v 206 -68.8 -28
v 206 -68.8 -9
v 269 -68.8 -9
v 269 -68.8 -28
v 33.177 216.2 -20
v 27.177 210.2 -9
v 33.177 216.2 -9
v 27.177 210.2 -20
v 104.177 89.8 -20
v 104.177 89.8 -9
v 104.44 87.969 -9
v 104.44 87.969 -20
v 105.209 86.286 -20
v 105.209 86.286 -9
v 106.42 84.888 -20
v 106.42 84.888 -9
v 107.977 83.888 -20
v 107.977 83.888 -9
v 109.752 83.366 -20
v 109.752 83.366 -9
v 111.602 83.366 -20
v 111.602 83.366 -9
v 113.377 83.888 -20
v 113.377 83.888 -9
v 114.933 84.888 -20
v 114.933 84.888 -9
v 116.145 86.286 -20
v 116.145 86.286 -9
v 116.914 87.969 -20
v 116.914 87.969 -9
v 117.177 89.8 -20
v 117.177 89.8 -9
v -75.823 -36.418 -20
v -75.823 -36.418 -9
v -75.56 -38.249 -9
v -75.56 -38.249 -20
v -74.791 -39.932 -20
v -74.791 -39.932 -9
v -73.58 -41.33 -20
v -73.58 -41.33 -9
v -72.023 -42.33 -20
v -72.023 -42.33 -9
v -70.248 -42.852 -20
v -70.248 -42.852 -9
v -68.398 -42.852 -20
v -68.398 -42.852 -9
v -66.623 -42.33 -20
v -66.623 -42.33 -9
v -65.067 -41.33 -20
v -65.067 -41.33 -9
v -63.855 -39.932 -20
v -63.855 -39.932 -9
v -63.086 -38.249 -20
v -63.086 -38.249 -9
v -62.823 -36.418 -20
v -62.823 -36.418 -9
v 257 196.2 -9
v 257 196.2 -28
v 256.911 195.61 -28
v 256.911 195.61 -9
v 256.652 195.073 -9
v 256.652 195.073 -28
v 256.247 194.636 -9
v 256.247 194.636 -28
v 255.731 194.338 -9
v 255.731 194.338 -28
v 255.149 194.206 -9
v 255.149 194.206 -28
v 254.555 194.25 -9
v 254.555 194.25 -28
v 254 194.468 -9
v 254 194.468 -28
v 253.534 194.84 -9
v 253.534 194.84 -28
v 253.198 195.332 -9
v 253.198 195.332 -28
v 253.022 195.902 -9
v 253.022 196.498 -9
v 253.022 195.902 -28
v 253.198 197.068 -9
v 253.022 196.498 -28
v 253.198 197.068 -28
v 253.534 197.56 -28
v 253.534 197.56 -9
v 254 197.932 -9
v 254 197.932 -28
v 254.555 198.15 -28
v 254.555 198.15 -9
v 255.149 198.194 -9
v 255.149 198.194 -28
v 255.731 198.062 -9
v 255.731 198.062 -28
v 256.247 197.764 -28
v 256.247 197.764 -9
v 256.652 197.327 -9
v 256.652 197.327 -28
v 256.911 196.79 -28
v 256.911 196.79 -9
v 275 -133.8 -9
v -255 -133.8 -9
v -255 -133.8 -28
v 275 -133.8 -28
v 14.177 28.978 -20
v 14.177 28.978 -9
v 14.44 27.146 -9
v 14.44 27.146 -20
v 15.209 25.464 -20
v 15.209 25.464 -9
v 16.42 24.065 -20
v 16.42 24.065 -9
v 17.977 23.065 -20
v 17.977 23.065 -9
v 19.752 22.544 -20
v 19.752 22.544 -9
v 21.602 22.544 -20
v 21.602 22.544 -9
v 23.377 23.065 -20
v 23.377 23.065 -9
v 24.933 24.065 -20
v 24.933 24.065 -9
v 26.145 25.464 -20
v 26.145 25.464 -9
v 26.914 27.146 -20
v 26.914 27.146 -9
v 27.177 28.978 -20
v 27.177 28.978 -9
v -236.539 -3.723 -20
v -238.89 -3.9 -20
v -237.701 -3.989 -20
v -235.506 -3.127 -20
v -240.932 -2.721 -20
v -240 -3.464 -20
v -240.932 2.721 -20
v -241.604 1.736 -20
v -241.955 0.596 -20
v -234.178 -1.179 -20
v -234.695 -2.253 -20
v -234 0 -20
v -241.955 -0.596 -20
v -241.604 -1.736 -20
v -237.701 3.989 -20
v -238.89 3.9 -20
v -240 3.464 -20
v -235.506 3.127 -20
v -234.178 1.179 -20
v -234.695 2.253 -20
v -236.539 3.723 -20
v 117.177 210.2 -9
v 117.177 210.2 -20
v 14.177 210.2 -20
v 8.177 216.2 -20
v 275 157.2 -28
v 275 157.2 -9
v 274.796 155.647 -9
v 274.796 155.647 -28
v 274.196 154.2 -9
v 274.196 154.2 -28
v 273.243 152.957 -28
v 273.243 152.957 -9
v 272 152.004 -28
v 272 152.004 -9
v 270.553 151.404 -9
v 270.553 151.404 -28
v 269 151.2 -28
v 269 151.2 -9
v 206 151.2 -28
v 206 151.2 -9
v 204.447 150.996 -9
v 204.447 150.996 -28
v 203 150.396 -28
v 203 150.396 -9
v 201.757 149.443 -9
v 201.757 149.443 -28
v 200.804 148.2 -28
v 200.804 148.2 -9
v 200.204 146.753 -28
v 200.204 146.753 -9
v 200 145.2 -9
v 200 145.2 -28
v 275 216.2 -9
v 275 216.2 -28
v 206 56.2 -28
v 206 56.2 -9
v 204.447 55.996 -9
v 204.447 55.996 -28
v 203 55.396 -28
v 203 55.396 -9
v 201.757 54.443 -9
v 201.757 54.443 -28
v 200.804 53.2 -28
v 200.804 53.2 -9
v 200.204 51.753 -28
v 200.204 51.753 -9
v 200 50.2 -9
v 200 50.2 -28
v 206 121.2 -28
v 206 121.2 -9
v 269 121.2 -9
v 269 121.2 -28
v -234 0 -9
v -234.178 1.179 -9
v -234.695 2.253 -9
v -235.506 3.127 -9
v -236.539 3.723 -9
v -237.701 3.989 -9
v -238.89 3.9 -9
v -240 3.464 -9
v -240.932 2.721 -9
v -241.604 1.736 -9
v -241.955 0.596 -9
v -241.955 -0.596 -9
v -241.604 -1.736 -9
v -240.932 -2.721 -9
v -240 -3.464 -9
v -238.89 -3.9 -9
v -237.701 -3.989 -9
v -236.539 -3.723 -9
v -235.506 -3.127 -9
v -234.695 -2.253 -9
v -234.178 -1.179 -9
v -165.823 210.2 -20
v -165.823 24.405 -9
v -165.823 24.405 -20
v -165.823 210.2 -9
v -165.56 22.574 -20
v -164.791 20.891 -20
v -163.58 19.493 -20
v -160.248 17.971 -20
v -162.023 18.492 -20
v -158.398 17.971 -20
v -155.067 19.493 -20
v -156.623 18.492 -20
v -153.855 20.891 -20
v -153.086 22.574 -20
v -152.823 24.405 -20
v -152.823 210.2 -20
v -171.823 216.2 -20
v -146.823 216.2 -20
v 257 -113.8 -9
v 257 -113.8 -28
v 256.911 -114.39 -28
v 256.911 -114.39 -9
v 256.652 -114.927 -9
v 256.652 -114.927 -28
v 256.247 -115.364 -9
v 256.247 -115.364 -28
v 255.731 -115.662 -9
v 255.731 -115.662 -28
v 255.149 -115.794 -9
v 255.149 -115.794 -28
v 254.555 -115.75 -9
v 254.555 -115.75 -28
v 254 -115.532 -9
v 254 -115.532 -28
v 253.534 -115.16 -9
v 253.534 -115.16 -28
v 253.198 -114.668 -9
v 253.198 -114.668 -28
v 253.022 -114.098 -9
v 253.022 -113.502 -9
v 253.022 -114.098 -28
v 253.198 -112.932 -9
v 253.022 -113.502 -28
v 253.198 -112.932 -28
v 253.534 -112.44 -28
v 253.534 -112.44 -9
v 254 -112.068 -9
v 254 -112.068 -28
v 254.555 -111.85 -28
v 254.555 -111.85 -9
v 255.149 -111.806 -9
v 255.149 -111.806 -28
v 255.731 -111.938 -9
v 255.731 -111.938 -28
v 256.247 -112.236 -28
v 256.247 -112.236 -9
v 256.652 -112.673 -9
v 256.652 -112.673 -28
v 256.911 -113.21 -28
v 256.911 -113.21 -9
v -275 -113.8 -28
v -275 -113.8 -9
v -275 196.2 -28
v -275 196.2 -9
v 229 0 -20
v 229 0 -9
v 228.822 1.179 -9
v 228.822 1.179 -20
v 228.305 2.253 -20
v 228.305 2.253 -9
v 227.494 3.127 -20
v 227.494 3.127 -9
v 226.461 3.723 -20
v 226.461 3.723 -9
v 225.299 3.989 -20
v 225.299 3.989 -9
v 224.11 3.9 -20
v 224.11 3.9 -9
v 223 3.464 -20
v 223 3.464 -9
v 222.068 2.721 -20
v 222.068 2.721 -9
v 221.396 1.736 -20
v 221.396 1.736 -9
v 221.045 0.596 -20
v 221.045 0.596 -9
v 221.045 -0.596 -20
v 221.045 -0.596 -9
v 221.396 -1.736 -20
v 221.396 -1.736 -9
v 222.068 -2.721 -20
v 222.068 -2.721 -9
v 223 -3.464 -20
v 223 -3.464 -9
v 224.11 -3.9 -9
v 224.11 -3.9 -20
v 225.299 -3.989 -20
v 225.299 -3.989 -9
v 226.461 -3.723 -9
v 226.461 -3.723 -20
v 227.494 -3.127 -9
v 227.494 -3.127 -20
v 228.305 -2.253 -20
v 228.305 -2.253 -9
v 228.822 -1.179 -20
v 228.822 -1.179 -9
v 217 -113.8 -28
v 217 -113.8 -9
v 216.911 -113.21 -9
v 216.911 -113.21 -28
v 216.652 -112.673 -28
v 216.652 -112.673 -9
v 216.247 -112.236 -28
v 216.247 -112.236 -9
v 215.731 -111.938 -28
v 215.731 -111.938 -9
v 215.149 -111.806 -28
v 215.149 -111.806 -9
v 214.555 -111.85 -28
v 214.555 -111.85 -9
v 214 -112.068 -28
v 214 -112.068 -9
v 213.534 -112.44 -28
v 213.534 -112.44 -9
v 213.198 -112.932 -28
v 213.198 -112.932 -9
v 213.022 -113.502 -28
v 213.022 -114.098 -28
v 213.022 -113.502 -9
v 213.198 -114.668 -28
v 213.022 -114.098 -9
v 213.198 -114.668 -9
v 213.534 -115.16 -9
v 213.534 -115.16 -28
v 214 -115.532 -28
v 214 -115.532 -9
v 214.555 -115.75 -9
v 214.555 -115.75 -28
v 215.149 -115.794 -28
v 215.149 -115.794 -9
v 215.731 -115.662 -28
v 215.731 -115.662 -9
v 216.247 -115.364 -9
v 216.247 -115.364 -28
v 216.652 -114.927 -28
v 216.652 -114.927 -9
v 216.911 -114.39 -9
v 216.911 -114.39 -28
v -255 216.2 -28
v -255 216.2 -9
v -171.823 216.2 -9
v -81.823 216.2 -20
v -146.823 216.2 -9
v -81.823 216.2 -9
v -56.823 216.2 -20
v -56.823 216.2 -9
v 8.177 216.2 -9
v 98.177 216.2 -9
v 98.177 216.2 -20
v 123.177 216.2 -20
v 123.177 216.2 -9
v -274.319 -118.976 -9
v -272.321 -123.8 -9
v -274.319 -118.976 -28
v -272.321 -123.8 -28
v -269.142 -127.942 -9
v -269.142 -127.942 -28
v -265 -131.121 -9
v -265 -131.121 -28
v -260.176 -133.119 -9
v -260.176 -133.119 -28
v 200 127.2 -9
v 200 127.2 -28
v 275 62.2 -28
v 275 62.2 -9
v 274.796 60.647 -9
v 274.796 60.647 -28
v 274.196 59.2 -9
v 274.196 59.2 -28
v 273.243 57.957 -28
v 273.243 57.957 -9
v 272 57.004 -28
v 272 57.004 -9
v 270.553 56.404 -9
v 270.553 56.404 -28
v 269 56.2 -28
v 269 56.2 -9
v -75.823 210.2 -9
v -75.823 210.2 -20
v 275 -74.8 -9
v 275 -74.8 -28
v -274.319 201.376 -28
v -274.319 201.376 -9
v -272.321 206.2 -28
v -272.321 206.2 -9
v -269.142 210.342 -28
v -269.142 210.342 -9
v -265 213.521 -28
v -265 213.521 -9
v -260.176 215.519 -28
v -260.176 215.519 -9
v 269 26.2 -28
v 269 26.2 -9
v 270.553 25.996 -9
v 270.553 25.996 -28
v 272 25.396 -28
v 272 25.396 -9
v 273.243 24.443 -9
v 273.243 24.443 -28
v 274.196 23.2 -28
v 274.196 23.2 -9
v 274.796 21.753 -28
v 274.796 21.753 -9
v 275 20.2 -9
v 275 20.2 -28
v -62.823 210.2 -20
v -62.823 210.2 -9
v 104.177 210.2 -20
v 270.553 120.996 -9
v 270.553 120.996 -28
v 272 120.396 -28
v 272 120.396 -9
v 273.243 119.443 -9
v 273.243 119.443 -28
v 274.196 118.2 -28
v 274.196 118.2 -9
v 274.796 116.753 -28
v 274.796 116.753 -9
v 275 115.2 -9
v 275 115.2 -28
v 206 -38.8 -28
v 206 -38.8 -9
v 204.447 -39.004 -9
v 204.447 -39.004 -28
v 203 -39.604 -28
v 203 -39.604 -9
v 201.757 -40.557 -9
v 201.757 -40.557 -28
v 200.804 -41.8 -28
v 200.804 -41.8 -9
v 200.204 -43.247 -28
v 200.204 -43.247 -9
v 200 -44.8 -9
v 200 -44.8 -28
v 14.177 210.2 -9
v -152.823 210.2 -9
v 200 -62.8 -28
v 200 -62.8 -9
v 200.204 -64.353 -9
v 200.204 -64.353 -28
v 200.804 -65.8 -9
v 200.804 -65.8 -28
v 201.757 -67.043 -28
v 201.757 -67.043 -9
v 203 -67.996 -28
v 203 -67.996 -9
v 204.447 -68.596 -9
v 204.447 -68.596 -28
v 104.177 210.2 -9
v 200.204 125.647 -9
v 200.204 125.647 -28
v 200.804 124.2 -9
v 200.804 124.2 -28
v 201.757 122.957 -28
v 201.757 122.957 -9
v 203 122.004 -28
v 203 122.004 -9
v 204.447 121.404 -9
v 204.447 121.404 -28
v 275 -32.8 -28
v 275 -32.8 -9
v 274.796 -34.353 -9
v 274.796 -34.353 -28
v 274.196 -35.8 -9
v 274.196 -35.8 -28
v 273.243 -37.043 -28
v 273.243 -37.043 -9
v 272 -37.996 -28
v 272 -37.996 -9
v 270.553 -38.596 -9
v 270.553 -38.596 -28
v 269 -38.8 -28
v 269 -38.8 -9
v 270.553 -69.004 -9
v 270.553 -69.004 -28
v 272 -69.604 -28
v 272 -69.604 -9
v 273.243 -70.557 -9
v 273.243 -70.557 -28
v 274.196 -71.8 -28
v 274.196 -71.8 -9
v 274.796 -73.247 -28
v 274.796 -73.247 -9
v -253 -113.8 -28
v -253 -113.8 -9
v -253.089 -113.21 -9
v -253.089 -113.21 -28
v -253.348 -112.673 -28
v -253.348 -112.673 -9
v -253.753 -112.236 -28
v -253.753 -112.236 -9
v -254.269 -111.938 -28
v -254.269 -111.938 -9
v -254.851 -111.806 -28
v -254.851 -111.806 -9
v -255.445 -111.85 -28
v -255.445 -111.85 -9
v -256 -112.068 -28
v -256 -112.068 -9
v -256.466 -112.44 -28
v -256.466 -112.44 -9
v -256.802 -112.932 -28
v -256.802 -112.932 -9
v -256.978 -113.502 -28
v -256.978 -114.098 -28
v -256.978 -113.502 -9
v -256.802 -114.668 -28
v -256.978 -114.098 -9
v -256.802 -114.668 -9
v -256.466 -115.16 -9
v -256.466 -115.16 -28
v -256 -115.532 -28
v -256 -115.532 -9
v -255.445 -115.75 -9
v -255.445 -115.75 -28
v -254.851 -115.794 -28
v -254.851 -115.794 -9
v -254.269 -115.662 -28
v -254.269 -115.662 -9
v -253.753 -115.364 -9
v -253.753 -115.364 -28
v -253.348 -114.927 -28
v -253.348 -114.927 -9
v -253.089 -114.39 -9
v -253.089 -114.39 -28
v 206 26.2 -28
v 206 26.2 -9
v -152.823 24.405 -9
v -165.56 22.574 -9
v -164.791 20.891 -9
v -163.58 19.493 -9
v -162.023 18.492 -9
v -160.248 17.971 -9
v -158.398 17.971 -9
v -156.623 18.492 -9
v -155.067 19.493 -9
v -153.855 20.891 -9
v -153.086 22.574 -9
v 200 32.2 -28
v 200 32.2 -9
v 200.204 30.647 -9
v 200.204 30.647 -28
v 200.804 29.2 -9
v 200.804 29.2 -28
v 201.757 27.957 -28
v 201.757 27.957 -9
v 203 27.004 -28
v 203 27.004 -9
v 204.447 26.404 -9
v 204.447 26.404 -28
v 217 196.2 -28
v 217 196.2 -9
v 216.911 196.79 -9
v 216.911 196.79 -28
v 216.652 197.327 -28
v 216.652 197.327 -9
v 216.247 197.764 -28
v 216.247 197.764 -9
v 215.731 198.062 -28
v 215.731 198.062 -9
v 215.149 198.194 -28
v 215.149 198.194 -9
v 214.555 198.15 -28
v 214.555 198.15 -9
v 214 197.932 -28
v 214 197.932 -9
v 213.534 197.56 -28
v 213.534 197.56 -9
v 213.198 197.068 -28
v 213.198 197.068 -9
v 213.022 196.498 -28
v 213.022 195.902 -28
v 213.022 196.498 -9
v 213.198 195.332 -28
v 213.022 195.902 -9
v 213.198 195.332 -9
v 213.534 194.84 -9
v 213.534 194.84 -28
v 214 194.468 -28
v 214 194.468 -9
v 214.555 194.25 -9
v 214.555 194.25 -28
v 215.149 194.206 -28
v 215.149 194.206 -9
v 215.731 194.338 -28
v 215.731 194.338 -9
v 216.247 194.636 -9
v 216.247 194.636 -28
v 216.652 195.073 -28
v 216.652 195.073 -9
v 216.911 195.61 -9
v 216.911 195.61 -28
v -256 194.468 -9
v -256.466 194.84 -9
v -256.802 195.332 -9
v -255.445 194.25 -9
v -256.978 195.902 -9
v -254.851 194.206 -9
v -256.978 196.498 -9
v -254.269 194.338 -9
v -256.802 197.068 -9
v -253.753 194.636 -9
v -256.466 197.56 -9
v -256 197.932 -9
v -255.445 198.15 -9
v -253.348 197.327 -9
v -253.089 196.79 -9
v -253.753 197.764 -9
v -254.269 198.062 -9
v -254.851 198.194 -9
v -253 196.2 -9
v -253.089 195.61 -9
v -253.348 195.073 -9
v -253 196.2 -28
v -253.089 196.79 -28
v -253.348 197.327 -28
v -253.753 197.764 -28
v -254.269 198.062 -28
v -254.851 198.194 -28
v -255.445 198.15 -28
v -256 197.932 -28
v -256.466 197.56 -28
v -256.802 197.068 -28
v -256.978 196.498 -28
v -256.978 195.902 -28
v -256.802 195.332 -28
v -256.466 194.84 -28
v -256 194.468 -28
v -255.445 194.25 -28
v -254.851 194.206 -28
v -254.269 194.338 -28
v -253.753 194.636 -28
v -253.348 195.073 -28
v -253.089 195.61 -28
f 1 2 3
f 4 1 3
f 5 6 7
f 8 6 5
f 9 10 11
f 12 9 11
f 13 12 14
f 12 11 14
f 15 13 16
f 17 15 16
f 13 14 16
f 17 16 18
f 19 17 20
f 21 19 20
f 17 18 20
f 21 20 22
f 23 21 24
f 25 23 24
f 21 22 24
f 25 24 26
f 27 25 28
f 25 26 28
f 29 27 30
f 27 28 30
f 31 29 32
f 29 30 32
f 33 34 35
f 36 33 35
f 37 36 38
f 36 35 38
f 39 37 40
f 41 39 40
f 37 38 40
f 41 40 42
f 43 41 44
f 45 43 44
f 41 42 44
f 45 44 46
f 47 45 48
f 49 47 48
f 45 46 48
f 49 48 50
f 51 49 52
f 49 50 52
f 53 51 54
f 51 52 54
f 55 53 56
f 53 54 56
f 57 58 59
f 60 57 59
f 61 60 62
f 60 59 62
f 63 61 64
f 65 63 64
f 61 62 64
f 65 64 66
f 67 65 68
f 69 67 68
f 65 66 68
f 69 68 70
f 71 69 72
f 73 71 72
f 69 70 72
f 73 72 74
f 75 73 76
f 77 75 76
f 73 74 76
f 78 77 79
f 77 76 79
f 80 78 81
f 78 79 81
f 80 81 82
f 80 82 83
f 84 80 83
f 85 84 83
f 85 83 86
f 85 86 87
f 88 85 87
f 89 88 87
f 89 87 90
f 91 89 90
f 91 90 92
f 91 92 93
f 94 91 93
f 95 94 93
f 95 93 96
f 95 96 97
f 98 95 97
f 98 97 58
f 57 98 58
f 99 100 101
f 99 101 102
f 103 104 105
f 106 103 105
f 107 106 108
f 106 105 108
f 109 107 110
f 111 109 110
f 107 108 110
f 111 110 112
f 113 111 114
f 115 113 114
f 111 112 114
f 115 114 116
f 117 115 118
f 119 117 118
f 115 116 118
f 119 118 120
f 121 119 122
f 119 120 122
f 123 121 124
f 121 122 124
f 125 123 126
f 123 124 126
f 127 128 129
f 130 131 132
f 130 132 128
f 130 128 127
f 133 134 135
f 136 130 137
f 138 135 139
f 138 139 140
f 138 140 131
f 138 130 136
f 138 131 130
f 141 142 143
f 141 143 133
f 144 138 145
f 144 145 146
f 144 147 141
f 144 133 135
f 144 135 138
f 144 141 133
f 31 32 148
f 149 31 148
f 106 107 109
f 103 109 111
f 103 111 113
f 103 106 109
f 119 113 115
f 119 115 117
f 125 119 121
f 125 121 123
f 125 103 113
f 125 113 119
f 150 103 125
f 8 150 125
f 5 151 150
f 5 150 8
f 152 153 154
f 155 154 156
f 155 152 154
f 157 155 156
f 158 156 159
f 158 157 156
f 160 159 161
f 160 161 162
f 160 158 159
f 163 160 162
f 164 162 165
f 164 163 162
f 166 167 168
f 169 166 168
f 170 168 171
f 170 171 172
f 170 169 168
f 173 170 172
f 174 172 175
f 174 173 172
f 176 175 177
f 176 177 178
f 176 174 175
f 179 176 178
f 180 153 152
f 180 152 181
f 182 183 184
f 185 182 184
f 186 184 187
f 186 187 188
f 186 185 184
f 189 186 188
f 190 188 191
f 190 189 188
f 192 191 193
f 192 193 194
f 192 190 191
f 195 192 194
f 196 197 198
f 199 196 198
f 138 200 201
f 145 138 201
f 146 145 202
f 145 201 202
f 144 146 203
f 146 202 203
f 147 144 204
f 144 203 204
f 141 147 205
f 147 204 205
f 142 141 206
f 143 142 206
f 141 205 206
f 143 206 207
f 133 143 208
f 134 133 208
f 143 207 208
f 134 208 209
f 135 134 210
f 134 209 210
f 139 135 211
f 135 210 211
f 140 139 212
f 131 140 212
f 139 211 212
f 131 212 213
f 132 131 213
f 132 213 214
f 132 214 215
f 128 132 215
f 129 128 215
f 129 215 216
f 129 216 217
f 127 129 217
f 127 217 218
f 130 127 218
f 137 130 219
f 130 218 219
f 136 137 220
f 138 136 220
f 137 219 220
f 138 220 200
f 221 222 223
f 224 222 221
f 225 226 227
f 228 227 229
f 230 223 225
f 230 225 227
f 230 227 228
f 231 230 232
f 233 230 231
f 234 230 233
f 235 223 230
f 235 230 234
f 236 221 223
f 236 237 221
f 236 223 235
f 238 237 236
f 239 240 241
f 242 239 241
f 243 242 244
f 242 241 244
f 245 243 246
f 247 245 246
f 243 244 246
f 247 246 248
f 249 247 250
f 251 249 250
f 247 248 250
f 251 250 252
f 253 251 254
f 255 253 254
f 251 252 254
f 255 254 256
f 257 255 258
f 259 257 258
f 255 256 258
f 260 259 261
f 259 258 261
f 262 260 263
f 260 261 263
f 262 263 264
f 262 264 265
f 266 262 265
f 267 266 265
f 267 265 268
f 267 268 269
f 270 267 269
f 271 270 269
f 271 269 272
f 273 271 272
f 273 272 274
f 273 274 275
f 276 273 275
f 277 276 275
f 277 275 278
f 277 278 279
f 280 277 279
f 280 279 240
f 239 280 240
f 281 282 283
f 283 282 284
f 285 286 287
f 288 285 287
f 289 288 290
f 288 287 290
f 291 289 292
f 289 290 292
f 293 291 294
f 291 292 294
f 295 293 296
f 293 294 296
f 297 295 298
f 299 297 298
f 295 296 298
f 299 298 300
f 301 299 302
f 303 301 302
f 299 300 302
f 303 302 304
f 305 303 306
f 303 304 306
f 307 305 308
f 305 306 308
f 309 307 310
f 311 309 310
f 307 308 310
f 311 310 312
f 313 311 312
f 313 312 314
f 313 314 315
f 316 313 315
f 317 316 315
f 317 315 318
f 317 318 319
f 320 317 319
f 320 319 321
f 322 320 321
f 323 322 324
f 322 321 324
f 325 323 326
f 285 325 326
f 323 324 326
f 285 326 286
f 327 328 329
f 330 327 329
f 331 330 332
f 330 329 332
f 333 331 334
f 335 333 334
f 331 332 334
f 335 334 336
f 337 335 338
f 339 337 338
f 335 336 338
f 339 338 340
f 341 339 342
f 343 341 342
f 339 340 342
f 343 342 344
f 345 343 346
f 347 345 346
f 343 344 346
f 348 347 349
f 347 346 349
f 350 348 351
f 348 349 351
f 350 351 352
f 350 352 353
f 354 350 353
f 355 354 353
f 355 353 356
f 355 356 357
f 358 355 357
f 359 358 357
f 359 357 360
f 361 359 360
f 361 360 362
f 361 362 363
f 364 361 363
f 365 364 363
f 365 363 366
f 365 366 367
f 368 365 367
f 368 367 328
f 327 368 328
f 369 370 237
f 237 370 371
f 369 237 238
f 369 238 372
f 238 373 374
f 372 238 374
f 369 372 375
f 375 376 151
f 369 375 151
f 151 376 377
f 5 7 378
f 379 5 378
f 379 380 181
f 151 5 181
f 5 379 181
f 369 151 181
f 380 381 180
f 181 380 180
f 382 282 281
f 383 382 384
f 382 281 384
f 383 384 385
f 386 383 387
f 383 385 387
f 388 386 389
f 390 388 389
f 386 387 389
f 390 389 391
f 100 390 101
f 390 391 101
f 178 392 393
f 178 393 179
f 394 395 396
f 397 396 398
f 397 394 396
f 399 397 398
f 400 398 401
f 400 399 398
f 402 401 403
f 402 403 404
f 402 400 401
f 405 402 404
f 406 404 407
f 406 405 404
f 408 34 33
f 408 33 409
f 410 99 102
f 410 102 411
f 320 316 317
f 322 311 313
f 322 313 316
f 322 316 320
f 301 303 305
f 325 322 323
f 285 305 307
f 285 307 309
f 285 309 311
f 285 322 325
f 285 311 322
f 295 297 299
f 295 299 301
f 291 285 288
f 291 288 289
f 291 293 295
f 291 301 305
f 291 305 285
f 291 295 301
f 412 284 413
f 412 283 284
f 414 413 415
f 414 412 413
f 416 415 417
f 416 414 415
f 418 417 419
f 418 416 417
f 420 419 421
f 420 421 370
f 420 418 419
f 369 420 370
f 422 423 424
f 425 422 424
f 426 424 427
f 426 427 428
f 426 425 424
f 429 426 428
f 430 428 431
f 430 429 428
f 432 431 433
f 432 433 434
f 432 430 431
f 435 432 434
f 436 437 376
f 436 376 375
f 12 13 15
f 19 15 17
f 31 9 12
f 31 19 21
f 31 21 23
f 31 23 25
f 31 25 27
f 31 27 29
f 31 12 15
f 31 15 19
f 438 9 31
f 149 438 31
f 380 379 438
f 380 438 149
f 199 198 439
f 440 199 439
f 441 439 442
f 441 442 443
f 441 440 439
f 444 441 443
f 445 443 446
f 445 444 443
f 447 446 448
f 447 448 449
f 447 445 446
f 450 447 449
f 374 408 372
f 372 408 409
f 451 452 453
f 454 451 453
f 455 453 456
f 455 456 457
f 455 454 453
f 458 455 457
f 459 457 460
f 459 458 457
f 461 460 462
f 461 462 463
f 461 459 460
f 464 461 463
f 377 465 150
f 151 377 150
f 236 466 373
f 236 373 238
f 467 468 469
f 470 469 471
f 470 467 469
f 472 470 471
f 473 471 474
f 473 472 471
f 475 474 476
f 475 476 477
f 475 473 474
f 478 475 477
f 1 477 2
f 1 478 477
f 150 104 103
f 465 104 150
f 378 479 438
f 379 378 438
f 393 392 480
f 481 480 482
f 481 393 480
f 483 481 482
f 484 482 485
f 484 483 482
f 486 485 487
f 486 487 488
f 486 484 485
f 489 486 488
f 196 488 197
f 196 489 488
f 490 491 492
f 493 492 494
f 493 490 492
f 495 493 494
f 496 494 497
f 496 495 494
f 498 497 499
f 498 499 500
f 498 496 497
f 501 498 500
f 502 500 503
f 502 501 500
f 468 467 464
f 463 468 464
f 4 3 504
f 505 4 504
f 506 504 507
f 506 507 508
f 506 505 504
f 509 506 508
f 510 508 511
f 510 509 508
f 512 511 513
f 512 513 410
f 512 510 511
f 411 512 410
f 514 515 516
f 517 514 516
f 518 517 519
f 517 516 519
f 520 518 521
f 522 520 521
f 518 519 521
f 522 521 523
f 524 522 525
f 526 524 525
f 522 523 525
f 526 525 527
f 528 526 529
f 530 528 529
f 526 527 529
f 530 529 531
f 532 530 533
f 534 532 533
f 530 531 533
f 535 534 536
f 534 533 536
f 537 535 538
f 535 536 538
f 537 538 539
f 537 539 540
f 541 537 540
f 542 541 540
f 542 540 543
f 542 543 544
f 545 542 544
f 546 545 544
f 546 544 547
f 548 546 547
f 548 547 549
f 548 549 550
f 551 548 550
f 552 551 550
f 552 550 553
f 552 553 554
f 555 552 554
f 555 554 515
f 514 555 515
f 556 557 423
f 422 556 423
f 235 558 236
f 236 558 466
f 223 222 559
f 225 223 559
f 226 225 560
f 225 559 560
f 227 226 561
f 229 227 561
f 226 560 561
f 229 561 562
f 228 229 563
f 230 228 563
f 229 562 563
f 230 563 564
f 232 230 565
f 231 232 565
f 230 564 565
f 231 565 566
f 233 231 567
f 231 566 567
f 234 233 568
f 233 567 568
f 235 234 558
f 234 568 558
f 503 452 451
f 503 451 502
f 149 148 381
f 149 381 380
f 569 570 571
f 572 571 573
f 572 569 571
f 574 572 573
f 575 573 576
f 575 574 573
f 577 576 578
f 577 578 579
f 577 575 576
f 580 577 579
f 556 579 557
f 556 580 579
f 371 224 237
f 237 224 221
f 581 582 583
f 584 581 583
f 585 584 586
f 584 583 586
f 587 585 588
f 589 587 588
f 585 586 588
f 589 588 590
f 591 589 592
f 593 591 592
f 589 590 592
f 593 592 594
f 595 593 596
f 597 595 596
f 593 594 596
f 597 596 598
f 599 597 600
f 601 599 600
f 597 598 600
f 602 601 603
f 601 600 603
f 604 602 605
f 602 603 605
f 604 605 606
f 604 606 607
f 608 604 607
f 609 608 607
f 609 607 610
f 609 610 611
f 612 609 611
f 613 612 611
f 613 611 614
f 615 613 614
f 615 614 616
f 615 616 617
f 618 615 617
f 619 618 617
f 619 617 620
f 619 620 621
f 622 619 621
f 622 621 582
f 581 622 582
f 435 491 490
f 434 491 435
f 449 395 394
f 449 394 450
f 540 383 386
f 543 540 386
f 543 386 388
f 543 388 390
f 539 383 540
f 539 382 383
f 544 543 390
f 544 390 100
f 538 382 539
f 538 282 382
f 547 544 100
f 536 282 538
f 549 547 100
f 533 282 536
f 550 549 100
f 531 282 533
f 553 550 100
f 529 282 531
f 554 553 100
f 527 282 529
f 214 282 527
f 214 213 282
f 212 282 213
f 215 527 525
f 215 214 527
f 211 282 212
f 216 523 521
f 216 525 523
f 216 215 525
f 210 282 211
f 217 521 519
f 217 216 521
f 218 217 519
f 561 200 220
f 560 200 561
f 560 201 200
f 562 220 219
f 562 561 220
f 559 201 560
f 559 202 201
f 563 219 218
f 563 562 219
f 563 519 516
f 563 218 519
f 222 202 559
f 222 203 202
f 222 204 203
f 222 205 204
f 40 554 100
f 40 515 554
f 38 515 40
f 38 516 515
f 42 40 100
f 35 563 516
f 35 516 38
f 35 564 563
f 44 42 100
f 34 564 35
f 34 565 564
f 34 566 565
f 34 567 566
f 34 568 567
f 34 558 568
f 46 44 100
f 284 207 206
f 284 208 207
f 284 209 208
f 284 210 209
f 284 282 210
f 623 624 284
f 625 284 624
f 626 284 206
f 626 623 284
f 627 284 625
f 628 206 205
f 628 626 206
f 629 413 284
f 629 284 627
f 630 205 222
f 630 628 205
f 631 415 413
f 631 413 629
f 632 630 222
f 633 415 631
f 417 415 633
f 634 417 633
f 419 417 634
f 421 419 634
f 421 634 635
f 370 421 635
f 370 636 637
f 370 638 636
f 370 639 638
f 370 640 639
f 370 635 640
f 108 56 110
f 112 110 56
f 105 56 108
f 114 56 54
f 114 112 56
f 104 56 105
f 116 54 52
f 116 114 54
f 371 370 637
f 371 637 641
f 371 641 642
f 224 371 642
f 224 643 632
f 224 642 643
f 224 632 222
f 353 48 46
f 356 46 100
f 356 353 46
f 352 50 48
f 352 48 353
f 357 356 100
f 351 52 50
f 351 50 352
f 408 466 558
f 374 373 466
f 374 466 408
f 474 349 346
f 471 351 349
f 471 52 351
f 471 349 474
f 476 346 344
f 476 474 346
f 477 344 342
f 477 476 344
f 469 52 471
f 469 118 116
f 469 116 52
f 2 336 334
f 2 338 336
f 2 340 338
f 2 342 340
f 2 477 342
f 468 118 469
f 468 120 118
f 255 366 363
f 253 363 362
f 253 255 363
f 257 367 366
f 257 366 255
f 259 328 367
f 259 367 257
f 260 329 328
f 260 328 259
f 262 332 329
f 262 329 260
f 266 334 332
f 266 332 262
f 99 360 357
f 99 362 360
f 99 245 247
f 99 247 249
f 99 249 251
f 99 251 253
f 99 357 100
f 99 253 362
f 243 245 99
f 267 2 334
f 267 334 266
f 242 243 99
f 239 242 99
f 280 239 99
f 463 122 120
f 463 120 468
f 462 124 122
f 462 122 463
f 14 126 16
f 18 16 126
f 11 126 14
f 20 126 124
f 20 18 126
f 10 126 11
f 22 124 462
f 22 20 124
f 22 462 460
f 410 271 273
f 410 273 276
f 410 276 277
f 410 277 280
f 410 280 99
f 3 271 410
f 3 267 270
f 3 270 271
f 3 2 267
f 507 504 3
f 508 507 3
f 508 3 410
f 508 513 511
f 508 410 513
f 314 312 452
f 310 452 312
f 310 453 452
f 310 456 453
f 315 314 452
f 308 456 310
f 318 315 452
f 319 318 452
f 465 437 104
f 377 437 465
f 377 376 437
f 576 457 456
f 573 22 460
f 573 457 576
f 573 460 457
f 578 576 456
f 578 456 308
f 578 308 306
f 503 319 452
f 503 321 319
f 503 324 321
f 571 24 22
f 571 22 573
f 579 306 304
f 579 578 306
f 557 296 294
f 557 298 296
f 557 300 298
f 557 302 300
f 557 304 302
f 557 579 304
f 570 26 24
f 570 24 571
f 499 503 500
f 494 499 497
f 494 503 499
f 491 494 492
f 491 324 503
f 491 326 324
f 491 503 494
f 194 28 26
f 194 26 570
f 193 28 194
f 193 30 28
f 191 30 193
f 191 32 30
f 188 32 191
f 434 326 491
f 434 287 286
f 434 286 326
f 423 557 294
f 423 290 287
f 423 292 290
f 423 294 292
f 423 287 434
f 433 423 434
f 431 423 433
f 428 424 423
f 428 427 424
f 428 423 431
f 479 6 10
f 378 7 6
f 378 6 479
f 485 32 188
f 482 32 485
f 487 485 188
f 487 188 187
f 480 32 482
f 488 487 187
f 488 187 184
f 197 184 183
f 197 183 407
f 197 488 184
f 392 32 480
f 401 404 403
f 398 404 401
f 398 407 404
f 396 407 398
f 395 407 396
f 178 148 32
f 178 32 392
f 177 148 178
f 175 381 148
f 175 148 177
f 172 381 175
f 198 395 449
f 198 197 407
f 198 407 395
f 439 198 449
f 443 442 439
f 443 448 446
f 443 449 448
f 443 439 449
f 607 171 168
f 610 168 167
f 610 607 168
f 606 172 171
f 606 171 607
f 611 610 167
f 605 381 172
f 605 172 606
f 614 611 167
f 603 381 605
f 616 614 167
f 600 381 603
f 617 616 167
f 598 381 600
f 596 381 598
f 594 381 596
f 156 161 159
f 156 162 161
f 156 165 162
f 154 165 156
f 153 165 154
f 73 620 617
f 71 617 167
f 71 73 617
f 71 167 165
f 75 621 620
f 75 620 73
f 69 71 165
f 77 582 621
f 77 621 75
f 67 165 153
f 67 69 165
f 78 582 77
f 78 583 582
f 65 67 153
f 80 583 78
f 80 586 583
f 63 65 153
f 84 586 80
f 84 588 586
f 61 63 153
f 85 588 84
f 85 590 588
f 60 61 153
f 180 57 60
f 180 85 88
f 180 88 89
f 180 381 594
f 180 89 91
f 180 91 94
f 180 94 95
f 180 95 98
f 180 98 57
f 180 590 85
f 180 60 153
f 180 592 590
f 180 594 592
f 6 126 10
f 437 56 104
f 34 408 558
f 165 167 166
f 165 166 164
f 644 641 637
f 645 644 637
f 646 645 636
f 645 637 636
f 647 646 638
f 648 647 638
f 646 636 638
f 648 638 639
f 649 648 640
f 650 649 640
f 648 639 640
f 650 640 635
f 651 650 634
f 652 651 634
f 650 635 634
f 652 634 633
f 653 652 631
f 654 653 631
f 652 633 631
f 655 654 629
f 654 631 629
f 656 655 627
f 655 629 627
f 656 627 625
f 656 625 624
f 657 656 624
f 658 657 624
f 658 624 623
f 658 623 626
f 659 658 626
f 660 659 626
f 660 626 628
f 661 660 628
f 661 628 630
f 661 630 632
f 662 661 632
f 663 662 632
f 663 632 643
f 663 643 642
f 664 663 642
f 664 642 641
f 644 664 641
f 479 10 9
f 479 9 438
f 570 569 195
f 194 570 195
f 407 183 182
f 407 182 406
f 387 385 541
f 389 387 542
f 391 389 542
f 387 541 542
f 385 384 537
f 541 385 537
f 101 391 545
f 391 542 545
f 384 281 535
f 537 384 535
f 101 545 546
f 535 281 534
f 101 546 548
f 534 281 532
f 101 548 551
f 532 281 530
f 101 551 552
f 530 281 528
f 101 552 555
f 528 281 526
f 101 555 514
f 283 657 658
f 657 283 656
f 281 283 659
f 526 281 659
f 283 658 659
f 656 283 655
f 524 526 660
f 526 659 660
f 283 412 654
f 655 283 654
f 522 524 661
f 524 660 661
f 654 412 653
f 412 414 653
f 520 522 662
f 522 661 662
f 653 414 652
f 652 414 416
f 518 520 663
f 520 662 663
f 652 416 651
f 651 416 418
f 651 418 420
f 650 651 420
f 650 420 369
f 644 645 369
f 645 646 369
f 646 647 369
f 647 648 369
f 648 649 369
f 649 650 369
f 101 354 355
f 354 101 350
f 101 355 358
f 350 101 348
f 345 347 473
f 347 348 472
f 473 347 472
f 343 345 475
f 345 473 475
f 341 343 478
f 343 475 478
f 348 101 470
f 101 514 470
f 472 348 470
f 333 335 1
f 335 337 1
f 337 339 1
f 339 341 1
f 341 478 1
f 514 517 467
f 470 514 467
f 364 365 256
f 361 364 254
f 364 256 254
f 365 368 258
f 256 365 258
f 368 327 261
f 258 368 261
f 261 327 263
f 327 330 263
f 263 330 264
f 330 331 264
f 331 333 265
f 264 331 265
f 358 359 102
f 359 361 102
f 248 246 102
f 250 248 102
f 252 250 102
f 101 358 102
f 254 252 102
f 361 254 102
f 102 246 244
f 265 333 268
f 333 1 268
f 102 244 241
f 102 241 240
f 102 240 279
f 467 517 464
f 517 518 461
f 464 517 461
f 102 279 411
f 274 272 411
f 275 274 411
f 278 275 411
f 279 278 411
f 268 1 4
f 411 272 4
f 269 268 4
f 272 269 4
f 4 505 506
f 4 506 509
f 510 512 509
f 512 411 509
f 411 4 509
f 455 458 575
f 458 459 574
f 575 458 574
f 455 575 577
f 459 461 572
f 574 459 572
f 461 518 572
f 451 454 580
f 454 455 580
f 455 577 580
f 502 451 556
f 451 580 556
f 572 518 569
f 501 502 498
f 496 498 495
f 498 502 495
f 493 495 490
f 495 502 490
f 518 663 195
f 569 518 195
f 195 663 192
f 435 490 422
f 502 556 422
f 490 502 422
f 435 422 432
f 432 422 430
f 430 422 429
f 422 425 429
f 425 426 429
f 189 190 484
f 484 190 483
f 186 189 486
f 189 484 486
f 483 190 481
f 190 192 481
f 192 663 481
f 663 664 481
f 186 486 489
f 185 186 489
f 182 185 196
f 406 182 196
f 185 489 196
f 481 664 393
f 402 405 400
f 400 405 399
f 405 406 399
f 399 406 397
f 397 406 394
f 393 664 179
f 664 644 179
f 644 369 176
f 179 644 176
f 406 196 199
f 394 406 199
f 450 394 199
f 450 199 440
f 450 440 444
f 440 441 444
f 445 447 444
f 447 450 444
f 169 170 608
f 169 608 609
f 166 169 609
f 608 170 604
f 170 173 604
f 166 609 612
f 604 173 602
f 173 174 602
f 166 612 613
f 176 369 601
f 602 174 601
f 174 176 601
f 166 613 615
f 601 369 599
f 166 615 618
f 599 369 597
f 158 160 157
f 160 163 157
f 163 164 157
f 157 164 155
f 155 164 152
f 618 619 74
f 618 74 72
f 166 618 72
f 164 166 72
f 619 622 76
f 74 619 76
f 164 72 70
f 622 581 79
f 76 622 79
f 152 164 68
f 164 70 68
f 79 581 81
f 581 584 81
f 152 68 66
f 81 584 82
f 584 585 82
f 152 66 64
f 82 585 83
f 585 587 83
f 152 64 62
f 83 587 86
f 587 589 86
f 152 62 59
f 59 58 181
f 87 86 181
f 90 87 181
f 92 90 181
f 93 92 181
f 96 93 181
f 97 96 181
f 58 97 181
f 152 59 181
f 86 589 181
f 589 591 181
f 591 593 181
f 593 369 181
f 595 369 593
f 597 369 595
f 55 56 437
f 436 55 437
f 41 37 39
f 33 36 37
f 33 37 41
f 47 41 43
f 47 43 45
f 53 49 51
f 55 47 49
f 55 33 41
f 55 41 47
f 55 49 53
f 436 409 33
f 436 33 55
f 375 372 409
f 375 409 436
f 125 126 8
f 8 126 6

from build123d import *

# Parameters (mm, degrees)
SKETCH011_W     = 550
SKETCH011_H     = 350
PAD012_DEPTH    = 19
SKETCH012_R     = 4
POCKET007_DEPTH = 11
FILLET_R        = 20
SKETCH013_R     = 2
POCKET008_DEPTH = 19.001
SKETCH014_W     = 75
SKETCH014_H     = 30
POCKET009_DEPTH = 19.001
FILLET004_R     = 6
SKETCH028_R     = 2
POCKET018_DEPTH = 19.001
CHAMFER008_SIZE = 6


with BuildPart() as part:
    # Sketch011 → Pad012 (new body)
    with BuildSketch(Plane.XY):
        with Locations((0, 41.2)):
            Rectangle(SKETCH011_W, SKETCH011_H)
    extrude(amount=-PAD012_DEPTH)

    # Sketch012 (on Face5 of Pad012) → Pocket007 (cut)
    with BuildSketch(Plane.XY):
        with Locations((-238, 0)):
            Circle(SKETCH012_R)
        with Locations((225, 0)):
            Circle(SKETCH012_R)
        with BuildLine():
            ThreePointArc((-165.823184, 24.404903), (-159.323184, 17.904903), (-152.823184, 24.404903))
            Line((-152.823184, 24.404903), (-152.823184, 216.2))
            ThreePointArc((-152.823184, 216.2), (-159.323184, 222.7), (-165.823184, 216.2))
            Line((-165.823184, 24.404903), (-165.823184, 216.2))
        make_face()
        with BuildLine():
            ThreePointArc((-75.823184, -36.417713), (-69.323184, -42.917713), (-62.823184, -36.417713))
            Line((-62.823184, -36.417713), (-62.823184, 216.2))
            ThreePointArc((-62.823184, 216.2), (-69.323184, 222.7), (-75.823184, 216.2))
            Line((-75.823184, -36.417713), (-75.823184, 216.2))
        make_face()
        with BuildLine():
            ThreePointArc((14.176816, 28.977719), (20.676816, 22.477719), (27.176816, 28.977719))
            Line((27.176816, 28.977719), (27.176816, 216.2))
            ThreePointArc((27.176816, 216.2), (20.676816, 222.7), (14.176816, 216.2))
            Line((14.176816, 28.977719), (14.176816, 216.2))
        make_face()
        with BuildLine():
            ThreePointArc((104.176816, 89.800335), (110.676816, 83.300335), (117.176816, 89.800335))
            Line((117.176816, 89.800335), (117.176816, 216.2))
            ThreePointArc((117.176816, 216.2), (110.676816, 222.7), (104.176816, 216.2))
            Line((104.176816, 89.800335), (104.176816, 216.2))
        make_face()
    extrude(amount=-POCKET007_DEPTH, mode=Mode.SUBTRACT)

    # Fillet
    fillet_edges = [part.edges().sort_by_distance(p)[0] for p in [
        (-275, -133.8, -9.5),
        (-275, 216.2, -9.5),
    ]]
    fillet(fillet_edges, radius=FILLET_R)

    # Sketch013 (on Face2 of Fillet) → Pocket008 (cut, through all)
    with BuildSketch(Plane.XY):
        with Locations((-255, 196.2)):
            Circle(SKETCH013_R)
        with Locations((-255, -113.8)):
            Circle(SKETCH013_R)
        with Locations((215, -113.8)):
            Circle(SKETCH013_R)
        with Locations((215, 196.2)):
            Circle(SKETCH013_R)
    extrude(amount=-POCKET008_DEPTH, mode=Mode.SUBTRACT)

    # Sketch014 (on Face2 of Pocket008) → Pocket009 (cut, through all)
    with BuildSketch(Plane.XY):
        with Locations((237.5, 136.2)):
            Rectangle(SKETCH014_W, SKETCH014_H)
        with Locations((237.5, -53.8)):
            Rectangle(SKETCH014_W, SKETCH014_H)
        with Locations((237.5, 41.2)):
            Rectangle(SKETCH014_W, SKETCH014_H)
    extrude(amount=-POCKET009_DEPTH, mode=Mode.SUBTRACT)

    # Fillet004
    fillet004_edges = [part.edges().sort_by_distance(p)[0] for p in [
        (275, 151.2, -9.5),
        (200, 151.2, -9.5),
        (275, 121.2, -9.5),
        (275, 56.2, -9.5),
        (200, 56.2, -9.5),
        (275, 26.2, -9.5),
        (200, -38.8, -9.5),
        (275, -38.8, -9.5),
        (275, -68.8, -9.5),
        (200, -68.8, -9.5),
        (200, 26.2, -9.5),
        (200, 121.2, -9.5),
    ]]
    fillet(fillet004_edges, radius=FILLET004_R)

    # Sketch028 (on Face50 of Fillet004) → Pocket018 (cut, through all)
    with BuildSketch(Plane(origin=(0, 0, -19), x_dir=(1, 0, 0), z_dir=(0, 0, -1))):
        with Locations((255, -196.2)):
            Circle(SKETCH028_R)
        with Locations((255, 113.8)):
            Circle(SKETCH028_R)
    extrude(amount=-POCKET018_DEPTH, mode=Mode.SUBTRACT)

    # Chamfer008
    chamfer008_edges = [part.edges().sort_by_distance(p)[0] for p in [
        (-165.823184, 216.2, -5.5),
        (-152.823184, 216.2, -5.5),
        (-75.823184, 216.2, -5.5),
        (-62.823184, 216.2, -5.5),
        (14.176816, 216.2, -5.5),
        (27.176816, 216.2, -5.5),
        (104.176816, 216.2, -5.5),
        (117.176816, 216.2, -5.5),
    ]]
    chamfer(chamfer008_edges, length=CHAMFER008_SIZE)


with BuildPart() as part_1:
    # Body008 placement: moved
    add(part.part.moved(Location((0, 0, -9))))


solid = part_1.part
